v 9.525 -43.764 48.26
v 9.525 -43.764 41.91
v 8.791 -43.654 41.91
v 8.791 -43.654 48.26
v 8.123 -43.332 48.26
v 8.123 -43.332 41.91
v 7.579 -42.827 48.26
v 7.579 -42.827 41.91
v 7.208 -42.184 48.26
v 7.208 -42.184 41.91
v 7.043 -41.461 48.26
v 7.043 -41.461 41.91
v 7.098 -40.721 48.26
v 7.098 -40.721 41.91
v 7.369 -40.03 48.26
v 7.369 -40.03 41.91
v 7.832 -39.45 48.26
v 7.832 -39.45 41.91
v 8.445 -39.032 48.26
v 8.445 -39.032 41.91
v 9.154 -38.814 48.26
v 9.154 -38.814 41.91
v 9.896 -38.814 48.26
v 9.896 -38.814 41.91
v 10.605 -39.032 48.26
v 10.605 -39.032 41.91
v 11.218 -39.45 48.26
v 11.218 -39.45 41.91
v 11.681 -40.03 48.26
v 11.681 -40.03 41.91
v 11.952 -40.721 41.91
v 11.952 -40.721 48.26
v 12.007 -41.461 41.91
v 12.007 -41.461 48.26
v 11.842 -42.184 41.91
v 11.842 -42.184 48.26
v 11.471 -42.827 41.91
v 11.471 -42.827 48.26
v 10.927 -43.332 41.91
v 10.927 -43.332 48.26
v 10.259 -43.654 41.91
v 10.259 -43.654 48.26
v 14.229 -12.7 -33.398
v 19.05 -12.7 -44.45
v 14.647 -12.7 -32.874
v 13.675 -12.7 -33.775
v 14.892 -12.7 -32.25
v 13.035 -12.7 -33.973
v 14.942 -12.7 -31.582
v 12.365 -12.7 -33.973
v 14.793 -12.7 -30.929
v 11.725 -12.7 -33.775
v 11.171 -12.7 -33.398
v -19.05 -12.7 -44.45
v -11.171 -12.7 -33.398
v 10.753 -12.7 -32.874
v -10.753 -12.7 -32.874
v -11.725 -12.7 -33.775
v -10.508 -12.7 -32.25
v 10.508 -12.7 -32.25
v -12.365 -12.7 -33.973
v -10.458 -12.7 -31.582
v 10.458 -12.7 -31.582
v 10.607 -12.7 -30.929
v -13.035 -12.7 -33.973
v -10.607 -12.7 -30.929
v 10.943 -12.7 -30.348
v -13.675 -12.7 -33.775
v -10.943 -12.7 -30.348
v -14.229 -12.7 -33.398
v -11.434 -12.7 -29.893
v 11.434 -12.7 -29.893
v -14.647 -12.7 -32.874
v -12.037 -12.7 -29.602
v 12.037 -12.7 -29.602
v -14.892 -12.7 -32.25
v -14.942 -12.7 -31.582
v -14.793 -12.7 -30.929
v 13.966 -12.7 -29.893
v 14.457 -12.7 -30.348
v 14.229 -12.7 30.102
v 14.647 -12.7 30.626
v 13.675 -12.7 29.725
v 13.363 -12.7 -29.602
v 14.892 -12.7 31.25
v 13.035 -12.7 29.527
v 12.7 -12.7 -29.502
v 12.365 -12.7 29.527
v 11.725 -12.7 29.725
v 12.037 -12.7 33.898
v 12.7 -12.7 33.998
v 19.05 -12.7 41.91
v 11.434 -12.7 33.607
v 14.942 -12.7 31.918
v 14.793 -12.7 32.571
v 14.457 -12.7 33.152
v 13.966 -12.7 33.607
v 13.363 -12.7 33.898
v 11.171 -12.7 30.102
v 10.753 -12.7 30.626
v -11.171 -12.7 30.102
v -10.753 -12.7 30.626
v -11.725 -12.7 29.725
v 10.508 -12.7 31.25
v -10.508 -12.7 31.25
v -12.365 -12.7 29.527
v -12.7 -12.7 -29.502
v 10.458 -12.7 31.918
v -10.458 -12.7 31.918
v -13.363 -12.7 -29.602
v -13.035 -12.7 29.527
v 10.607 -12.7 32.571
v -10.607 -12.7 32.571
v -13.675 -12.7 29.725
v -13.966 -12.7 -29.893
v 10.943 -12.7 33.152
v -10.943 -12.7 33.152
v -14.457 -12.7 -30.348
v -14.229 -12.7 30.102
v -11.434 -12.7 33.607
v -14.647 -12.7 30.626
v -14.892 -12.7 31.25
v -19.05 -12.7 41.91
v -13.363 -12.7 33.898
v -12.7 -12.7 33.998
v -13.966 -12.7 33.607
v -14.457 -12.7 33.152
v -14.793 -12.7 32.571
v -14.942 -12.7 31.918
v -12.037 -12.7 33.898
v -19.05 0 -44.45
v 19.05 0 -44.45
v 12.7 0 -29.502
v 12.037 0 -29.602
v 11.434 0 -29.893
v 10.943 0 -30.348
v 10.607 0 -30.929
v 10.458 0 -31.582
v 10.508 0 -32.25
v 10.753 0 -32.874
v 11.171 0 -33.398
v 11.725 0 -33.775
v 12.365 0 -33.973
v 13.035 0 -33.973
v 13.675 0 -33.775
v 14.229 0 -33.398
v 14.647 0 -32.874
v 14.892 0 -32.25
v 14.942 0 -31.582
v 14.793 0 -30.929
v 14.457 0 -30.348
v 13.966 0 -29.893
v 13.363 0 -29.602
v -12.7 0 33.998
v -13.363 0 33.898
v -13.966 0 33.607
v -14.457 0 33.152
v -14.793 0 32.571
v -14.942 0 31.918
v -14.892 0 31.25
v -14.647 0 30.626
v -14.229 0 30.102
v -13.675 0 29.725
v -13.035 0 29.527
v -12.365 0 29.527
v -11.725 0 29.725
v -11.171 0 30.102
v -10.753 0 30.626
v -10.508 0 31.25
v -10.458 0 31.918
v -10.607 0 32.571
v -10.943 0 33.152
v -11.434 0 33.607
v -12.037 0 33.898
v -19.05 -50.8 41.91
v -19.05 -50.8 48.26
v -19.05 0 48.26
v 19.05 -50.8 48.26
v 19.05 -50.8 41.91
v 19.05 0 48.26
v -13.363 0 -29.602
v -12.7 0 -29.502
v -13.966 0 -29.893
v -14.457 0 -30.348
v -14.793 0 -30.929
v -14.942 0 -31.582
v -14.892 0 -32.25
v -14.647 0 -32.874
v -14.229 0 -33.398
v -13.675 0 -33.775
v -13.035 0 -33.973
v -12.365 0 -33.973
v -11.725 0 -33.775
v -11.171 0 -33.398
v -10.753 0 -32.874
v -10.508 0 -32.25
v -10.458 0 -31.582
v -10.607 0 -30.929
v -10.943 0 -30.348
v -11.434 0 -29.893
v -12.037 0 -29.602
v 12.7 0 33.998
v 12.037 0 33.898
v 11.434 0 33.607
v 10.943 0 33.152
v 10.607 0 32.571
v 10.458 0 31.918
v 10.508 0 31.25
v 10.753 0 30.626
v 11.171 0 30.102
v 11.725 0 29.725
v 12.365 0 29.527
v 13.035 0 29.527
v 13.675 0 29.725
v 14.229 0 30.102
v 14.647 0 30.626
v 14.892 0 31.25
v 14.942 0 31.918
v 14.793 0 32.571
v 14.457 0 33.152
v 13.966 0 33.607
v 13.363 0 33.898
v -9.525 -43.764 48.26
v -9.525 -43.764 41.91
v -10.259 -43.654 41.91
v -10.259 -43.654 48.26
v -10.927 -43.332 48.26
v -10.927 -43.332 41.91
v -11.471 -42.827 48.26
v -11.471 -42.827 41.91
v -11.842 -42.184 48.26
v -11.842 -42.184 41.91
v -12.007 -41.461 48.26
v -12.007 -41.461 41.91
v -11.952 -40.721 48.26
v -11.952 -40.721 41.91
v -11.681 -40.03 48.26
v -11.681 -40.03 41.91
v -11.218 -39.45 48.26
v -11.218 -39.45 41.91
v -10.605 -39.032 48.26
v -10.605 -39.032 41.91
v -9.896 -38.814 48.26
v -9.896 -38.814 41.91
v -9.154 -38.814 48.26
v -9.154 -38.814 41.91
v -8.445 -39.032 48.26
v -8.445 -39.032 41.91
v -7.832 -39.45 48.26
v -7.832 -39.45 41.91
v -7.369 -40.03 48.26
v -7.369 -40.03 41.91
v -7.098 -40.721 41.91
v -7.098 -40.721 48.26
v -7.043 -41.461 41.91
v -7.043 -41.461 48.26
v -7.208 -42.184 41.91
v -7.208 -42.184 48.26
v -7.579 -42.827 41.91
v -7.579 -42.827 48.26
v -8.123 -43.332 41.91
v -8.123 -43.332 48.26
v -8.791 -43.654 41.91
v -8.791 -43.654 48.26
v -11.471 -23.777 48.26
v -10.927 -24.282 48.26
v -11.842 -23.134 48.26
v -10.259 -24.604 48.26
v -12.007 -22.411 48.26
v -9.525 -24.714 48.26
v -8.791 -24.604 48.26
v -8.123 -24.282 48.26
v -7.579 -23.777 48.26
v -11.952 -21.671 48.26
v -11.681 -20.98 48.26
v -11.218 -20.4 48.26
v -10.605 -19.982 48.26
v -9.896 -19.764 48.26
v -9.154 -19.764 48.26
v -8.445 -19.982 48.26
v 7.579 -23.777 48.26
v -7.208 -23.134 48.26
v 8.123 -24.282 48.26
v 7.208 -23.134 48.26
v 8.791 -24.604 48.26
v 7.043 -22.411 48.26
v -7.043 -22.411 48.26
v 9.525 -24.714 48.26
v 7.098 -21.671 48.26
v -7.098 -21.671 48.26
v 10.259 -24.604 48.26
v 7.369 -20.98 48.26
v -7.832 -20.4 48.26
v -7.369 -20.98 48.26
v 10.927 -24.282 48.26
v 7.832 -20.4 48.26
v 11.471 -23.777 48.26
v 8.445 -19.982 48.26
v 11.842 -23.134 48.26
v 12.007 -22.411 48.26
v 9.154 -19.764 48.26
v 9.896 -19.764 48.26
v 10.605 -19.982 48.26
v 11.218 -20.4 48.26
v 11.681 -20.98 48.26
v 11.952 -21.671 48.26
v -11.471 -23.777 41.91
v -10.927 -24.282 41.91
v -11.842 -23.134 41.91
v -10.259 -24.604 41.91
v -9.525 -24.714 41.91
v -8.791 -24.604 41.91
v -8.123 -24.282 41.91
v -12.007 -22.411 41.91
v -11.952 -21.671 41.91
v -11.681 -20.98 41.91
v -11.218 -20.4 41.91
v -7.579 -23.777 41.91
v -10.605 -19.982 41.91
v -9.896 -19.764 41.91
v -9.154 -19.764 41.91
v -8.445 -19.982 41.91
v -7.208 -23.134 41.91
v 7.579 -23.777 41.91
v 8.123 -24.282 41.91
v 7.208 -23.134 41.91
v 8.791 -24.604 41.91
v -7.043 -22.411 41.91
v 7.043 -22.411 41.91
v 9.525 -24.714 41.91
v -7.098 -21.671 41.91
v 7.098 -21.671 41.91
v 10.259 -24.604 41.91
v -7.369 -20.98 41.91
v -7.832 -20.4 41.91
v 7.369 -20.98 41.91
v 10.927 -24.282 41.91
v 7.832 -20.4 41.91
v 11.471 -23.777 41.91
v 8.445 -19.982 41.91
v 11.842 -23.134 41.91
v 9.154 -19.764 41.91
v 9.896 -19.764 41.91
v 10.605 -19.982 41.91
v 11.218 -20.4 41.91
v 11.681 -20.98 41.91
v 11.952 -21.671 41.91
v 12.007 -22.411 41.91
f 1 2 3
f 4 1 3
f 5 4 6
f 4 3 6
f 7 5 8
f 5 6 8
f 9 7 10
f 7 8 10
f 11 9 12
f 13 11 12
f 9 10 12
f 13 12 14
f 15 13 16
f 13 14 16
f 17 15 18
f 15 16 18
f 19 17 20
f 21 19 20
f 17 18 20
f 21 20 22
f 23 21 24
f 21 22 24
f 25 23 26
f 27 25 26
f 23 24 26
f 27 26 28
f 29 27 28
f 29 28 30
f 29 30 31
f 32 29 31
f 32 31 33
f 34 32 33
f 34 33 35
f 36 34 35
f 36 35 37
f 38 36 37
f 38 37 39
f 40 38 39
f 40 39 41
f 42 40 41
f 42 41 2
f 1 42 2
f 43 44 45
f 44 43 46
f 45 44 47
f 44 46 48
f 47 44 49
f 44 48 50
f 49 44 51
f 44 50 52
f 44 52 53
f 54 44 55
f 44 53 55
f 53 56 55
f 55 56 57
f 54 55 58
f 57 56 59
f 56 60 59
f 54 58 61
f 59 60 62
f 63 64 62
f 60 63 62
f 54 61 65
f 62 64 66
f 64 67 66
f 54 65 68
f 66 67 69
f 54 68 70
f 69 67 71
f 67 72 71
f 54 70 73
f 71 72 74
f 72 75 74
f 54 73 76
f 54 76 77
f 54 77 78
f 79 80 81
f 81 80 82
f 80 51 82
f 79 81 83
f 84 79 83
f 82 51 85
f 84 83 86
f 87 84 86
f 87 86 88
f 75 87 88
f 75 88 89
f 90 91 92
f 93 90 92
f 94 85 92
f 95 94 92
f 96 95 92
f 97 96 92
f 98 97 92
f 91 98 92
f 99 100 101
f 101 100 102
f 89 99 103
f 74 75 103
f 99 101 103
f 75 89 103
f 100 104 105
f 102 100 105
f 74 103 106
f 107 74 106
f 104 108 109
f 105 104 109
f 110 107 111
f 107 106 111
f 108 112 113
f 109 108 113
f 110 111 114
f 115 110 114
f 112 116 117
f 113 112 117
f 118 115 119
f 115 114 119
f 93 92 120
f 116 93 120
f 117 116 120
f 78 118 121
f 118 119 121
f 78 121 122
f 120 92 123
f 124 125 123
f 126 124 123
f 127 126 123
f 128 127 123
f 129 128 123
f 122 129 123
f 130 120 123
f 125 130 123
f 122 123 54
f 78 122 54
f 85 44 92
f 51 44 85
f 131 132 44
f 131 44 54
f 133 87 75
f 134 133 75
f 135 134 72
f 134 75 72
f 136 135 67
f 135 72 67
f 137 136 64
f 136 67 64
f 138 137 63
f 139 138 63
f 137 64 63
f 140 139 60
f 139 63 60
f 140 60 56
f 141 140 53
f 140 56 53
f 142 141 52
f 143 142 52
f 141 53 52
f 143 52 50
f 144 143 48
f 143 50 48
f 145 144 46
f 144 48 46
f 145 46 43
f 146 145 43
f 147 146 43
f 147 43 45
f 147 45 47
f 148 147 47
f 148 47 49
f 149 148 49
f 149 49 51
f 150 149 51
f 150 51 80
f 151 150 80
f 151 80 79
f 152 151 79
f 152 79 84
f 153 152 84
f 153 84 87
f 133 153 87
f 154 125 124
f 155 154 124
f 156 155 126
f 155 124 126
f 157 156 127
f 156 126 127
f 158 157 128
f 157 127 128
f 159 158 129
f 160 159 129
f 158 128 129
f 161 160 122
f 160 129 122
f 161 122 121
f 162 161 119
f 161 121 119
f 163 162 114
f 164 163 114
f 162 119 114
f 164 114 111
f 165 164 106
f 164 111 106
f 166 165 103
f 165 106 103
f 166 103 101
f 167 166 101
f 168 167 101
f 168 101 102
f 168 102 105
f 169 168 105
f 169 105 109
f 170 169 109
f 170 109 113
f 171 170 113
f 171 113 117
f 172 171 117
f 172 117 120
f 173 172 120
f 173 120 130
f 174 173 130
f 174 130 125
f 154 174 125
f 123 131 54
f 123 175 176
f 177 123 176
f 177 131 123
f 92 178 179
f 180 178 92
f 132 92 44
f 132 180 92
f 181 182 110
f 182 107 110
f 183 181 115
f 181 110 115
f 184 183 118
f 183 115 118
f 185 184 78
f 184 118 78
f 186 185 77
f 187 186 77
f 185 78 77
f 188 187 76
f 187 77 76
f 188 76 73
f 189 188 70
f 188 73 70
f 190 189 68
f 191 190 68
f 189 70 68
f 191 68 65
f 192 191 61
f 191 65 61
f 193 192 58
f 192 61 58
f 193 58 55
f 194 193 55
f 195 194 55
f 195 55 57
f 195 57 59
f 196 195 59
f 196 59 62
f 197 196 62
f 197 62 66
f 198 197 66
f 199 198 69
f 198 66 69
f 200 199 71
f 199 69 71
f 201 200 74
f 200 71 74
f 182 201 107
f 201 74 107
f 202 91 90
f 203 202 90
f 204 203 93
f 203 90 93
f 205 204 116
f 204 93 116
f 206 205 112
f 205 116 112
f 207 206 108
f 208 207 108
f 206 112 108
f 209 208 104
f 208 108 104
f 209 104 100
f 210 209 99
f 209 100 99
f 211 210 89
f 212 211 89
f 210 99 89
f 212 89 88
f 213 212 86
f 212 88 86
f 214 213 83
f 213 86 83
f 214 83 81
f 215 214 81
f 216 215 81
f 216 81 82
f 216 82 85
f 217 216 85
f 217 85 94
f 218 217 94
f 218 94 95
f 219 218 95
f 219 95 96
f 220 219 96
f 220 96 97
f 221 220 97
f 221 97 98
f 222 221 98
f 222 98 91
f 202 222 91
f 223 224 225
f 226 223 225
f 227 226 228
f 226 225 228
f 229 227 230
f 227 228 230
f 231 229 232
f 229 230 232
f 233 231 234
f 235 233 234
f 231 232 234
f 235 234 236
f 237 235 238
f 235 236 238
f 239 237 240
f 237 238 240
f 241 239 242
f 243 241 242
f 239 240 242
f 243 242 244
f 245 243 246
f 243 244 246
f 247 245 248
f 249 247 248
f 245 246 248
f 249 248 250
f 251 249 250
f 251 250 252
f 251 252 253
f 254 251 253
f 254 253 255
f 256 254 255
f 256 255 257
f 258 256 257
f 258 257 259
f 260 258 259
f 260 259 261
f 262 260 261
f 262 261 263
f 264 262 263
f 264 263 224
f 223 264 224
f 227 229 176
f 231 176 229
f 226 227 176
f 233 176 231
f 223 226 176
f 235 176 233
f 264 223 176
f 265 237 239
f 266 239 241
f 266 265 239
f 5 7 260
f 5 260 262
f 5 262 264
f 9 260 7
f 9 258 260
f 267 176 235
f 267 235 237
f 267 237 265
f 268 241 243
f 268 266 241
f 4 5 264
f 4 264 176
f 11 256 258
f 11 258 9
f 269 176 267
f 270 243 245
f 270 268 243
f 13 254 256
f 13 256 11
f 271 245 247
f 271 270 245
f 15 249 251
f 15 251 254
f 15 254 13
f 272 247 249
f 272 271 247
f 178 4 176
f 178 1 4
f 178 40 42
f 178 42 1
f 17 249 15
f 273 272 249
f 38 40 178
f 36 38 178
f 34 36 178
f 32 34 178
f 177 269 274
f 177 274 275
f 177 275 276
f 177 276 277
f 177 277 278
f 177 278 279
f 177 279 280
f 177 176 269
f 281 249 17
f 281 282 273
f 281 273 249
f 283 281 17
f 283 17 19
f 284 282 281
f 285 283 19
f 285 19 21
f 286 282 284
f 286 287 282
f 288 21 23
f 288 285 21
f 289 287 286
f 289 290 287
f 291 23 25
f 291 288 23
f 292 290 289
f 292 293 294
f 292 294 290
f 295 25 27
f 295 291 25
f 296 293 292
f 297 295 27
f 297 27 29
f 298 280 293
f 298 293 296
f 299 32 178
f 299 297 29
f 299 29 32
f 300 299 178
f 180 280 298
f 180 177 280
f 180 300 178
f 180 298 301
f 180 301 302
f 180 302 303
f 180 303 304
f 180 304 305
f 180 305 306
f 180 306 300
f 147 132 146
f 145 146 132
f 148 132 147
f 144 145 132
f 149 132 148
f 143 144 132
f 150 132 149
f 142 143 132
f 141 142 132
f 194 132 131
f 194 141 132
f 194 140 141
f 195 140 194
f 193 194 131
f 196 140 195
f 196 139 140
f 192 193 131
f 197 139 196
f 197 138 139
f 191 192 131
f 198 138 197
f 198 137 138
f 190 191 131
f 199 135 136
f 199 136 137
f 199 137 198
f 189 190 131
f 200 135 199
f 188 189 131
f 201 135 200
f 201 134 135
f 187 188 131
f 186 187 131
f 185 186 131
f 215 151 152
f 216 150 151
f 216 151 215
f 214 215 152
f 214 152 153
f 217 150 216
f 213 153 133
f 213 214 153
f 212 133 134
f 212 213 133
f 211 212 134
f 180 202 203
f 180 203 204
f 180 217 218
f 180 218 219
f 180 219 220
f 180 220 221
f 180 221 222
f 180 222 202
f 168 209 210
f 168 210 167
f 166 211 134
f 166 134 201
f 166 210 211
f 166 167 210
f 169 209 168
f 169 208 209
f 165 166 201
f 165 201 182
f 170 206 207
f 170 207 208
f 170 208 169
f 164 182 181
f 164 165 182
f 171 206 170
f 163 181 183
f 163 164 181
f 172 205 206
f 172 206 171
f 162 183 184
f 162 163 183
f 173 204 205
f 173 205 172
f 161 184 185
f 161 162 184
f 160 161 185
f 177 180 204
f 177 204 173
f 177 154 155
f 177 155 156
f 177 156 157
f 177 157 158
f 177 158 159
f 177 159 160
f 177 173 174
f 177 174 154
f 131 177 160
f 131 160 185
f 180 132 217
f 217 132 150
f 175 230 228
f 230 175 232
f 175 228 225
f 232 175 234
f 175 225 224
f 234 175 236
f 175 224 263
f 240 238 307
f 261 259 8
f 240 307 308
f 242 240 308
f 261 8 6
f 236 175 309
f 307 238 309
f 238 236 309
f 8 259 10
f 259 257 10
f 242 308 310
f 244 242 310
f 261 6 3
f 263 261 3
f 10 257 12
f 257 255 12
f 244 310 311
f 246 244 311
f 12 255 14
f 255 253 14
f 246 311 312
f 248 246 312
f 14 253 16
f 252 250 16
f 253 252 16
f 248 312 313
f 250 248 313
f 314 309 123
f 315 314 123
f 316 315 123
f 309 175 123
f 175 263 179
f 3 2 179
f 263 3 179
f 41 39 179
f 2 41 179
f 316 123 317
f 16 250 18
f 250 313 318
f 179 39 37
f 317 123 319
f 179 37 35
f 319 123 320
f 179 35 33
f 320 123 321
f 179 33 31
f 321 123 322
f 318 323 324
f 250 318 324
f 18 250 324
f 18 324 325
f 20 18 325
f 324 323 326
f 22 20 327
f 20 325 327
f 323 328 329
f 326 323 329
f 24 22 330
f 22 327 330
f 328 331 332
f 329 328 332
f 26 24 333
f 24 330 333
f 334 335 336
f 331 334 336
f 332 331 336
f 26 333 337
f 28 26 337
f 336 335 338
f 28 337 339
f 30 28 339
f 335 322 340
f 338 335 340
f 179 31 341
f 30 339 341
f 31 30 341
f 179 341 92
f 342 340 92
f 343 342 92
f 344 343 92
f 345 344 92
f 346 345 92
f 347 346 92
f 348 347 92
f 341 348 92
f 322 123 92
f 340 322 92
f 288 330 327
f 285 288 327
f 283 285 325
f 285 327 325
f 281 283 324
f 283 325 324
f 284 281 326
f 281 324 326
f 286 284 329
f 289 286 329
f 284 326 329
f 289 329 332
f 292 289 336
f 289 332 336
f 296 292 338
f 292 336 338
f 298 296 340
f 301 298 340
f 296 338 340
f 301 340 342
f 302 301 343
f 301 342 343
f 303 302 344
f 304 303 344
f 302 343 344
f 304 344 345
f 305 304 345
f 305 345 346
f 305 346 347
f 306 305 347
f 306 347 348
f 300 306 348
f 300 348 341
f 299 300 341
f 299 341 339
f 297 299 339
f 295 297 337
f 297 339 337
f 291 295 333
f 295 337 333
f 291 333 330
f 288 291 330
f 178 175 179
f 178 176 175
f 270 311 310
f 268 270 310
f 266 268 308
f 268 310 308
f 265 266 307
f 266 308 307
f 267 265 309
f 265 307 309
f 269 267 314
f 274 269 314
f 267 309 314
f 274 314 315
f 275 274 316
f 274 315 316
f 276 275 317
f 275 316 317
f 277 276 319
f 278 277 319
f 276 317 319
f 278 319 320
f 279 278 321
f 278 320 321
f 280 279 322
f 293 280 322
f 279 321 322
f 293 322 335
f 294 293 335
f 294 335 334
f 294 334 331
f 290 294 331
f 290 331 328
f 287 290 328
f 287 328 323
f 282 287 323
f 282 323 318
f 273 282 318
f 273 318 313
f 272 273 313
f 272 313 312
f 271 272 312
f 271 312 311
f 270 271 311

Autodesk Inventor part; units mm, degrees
ref_plane "YZ Plane" through (0, 0, 0) normal (1, 0, 0) x (0, 1, 0)
ref_plane "XZ Plane" through (0, 0, 0) normal (0, 1, 0) x (-1, 0, 0)
ref_plane "XY Plane" through (0, 0, 0) normal (0, 0, 1) x (1, 0, 0)
sketch "Sketch2" plane through (0, 0, 0) normal (0, 1, 0) x (-1, 0, 0)
  line L0 (-19.05, 44.45) -> (-19.05, -44.45)
  line L1 (-19.05, -44.45) -> (19.05, -44.45)
  line L2 (19.05, -44.45) -> (19.05, 44.45)
  line L3 (19.05, 44.45) -> (-19.05, 44.45) construction
  line L4 (-19.05, 44.45) -> (19.05, -44.45) construction
  line L5 (-19.05, -44.45) -> (19.05, 44.45) construction
  line L6 (19.05, 44.45) -> (19.05, 48.26)
  line L7 (19.05, 48.26) -> (-19.05, 48.26)
  line L8 (-19.05, 48.26) -> (-19.05, 43.3404)
  point P0 (0, 0)
  dimension "lengthBaseAirCylinder" = 88.9
  dimension "widthBaseOfAirCylinder" = 38.1
  dimension "extenstionForStroke" = 3.81
extrude "Extrusion1" add sketch "Sketch2" against normal blind 12.7
sketch "Sketch3" plane through (0, -12.7, 0) normal (0, -1, 0) x (1, 0, 0)
  line L0 (19.05, -44.45) -> (19.05, 48.26) projected
  line L1 (-19.05, 48.26) -> (-19.05, -44.45) projected
  line L2 (19.05, 48.26) -> (-19.05, 48.26)
  line L3 (-19.05, 48.26) -> (-19.05, 41.91)
  line L4 (-19.05, 41.91) -> (19.05, 41.91)
  line L5 (19.05, 41.91) -> (19.05, 48.26)
  point P0 (0, 0)
  dimension "d9" = 6.35
extrude "Extrusion2" add sketch "Sketch3" along normal blind 38.1
sketch "Sketch4" plane through (0, 0, 0) normal (0, 1, 0) x (1, 0, 0)
  line L0 (12.7, -31.75) -> (12.7, 31.75) construction
  line L1 (12.7, 31.75) -> (-12.7, 31.75) construction
  line L2 (-12.7, 31.75) -> (-12.7, -31.75) construction
  line L3 (-12.7, -31.75) -> (12.7, -31.75) construction
  line L4 (12.7, -31.75) -> (-12.7, 31.75) construction
  line L5 (12.7, 31.75) -> (-12.7, -31.75) construction
  point P0 (0, 0)
  dimension "widthForCylinderBoltHoles" = 25.4
  dimension "lengthForCylinderHoles" = 63.5
hole "Hole1" at (12.7, 0, 31.75) at (12.7, 0, -31.75) at (-12.7, 0, -31.75) at (-12.7, 0, 31.75) direction (0, -1, 0) diameter 4.4958 end through all clearance for "Flat Head Machine Screw (82)" size "#8" standard "Ansi Unified Screw Threads"
sketch "Sketch5" plane through (-19.05, 0, 48.26) normal (0, 0, 1) x (1, 0, 0)
  line L0 (38.1, -12.7) -> (0, -12.7) projected
  line L1 (19.05, -12.7) -> (19.05, -50.8) construction
  line L2 (38.1, -50.8) -> (0, -50.8) construction
  line L3 (9.525, -41.275) -> (28.575, -41.275) construction
  line L4 (28.575, -41.275) -> (28.575, -22.225) construction
  line L5 (28.575, -22.225) -> (9.525, -22.225) construction
  line L6 (9.525, -22.225) -> (9.525, -41.275) construction
  line L7 (9.525, -41.275) -> (28.575, -22.225) construction
  line L8 (28.575, -41.275) -> (9.525, -22.225) construction
  point P0 (19.05, 0)
  point P1 (19.05, -31.75)
  dimension "d21" = 19.05
  dimension "d22" = 19.05
hole "Hole2" at (-9.525, -41.275, 48.26) at (9.525, -41.275, 48.26) at (9.525, -22.225, 48.26) at (-9.525, -22.225, 48.26) direction (0, 0, -1) diameter 4.9784 end through all thread size "1/4-20 UNC" class "2B" standard "ANSI Unified Screw Threads"
properties part number "SupportForStopAirCylinder" material "Aluminum 6061"
